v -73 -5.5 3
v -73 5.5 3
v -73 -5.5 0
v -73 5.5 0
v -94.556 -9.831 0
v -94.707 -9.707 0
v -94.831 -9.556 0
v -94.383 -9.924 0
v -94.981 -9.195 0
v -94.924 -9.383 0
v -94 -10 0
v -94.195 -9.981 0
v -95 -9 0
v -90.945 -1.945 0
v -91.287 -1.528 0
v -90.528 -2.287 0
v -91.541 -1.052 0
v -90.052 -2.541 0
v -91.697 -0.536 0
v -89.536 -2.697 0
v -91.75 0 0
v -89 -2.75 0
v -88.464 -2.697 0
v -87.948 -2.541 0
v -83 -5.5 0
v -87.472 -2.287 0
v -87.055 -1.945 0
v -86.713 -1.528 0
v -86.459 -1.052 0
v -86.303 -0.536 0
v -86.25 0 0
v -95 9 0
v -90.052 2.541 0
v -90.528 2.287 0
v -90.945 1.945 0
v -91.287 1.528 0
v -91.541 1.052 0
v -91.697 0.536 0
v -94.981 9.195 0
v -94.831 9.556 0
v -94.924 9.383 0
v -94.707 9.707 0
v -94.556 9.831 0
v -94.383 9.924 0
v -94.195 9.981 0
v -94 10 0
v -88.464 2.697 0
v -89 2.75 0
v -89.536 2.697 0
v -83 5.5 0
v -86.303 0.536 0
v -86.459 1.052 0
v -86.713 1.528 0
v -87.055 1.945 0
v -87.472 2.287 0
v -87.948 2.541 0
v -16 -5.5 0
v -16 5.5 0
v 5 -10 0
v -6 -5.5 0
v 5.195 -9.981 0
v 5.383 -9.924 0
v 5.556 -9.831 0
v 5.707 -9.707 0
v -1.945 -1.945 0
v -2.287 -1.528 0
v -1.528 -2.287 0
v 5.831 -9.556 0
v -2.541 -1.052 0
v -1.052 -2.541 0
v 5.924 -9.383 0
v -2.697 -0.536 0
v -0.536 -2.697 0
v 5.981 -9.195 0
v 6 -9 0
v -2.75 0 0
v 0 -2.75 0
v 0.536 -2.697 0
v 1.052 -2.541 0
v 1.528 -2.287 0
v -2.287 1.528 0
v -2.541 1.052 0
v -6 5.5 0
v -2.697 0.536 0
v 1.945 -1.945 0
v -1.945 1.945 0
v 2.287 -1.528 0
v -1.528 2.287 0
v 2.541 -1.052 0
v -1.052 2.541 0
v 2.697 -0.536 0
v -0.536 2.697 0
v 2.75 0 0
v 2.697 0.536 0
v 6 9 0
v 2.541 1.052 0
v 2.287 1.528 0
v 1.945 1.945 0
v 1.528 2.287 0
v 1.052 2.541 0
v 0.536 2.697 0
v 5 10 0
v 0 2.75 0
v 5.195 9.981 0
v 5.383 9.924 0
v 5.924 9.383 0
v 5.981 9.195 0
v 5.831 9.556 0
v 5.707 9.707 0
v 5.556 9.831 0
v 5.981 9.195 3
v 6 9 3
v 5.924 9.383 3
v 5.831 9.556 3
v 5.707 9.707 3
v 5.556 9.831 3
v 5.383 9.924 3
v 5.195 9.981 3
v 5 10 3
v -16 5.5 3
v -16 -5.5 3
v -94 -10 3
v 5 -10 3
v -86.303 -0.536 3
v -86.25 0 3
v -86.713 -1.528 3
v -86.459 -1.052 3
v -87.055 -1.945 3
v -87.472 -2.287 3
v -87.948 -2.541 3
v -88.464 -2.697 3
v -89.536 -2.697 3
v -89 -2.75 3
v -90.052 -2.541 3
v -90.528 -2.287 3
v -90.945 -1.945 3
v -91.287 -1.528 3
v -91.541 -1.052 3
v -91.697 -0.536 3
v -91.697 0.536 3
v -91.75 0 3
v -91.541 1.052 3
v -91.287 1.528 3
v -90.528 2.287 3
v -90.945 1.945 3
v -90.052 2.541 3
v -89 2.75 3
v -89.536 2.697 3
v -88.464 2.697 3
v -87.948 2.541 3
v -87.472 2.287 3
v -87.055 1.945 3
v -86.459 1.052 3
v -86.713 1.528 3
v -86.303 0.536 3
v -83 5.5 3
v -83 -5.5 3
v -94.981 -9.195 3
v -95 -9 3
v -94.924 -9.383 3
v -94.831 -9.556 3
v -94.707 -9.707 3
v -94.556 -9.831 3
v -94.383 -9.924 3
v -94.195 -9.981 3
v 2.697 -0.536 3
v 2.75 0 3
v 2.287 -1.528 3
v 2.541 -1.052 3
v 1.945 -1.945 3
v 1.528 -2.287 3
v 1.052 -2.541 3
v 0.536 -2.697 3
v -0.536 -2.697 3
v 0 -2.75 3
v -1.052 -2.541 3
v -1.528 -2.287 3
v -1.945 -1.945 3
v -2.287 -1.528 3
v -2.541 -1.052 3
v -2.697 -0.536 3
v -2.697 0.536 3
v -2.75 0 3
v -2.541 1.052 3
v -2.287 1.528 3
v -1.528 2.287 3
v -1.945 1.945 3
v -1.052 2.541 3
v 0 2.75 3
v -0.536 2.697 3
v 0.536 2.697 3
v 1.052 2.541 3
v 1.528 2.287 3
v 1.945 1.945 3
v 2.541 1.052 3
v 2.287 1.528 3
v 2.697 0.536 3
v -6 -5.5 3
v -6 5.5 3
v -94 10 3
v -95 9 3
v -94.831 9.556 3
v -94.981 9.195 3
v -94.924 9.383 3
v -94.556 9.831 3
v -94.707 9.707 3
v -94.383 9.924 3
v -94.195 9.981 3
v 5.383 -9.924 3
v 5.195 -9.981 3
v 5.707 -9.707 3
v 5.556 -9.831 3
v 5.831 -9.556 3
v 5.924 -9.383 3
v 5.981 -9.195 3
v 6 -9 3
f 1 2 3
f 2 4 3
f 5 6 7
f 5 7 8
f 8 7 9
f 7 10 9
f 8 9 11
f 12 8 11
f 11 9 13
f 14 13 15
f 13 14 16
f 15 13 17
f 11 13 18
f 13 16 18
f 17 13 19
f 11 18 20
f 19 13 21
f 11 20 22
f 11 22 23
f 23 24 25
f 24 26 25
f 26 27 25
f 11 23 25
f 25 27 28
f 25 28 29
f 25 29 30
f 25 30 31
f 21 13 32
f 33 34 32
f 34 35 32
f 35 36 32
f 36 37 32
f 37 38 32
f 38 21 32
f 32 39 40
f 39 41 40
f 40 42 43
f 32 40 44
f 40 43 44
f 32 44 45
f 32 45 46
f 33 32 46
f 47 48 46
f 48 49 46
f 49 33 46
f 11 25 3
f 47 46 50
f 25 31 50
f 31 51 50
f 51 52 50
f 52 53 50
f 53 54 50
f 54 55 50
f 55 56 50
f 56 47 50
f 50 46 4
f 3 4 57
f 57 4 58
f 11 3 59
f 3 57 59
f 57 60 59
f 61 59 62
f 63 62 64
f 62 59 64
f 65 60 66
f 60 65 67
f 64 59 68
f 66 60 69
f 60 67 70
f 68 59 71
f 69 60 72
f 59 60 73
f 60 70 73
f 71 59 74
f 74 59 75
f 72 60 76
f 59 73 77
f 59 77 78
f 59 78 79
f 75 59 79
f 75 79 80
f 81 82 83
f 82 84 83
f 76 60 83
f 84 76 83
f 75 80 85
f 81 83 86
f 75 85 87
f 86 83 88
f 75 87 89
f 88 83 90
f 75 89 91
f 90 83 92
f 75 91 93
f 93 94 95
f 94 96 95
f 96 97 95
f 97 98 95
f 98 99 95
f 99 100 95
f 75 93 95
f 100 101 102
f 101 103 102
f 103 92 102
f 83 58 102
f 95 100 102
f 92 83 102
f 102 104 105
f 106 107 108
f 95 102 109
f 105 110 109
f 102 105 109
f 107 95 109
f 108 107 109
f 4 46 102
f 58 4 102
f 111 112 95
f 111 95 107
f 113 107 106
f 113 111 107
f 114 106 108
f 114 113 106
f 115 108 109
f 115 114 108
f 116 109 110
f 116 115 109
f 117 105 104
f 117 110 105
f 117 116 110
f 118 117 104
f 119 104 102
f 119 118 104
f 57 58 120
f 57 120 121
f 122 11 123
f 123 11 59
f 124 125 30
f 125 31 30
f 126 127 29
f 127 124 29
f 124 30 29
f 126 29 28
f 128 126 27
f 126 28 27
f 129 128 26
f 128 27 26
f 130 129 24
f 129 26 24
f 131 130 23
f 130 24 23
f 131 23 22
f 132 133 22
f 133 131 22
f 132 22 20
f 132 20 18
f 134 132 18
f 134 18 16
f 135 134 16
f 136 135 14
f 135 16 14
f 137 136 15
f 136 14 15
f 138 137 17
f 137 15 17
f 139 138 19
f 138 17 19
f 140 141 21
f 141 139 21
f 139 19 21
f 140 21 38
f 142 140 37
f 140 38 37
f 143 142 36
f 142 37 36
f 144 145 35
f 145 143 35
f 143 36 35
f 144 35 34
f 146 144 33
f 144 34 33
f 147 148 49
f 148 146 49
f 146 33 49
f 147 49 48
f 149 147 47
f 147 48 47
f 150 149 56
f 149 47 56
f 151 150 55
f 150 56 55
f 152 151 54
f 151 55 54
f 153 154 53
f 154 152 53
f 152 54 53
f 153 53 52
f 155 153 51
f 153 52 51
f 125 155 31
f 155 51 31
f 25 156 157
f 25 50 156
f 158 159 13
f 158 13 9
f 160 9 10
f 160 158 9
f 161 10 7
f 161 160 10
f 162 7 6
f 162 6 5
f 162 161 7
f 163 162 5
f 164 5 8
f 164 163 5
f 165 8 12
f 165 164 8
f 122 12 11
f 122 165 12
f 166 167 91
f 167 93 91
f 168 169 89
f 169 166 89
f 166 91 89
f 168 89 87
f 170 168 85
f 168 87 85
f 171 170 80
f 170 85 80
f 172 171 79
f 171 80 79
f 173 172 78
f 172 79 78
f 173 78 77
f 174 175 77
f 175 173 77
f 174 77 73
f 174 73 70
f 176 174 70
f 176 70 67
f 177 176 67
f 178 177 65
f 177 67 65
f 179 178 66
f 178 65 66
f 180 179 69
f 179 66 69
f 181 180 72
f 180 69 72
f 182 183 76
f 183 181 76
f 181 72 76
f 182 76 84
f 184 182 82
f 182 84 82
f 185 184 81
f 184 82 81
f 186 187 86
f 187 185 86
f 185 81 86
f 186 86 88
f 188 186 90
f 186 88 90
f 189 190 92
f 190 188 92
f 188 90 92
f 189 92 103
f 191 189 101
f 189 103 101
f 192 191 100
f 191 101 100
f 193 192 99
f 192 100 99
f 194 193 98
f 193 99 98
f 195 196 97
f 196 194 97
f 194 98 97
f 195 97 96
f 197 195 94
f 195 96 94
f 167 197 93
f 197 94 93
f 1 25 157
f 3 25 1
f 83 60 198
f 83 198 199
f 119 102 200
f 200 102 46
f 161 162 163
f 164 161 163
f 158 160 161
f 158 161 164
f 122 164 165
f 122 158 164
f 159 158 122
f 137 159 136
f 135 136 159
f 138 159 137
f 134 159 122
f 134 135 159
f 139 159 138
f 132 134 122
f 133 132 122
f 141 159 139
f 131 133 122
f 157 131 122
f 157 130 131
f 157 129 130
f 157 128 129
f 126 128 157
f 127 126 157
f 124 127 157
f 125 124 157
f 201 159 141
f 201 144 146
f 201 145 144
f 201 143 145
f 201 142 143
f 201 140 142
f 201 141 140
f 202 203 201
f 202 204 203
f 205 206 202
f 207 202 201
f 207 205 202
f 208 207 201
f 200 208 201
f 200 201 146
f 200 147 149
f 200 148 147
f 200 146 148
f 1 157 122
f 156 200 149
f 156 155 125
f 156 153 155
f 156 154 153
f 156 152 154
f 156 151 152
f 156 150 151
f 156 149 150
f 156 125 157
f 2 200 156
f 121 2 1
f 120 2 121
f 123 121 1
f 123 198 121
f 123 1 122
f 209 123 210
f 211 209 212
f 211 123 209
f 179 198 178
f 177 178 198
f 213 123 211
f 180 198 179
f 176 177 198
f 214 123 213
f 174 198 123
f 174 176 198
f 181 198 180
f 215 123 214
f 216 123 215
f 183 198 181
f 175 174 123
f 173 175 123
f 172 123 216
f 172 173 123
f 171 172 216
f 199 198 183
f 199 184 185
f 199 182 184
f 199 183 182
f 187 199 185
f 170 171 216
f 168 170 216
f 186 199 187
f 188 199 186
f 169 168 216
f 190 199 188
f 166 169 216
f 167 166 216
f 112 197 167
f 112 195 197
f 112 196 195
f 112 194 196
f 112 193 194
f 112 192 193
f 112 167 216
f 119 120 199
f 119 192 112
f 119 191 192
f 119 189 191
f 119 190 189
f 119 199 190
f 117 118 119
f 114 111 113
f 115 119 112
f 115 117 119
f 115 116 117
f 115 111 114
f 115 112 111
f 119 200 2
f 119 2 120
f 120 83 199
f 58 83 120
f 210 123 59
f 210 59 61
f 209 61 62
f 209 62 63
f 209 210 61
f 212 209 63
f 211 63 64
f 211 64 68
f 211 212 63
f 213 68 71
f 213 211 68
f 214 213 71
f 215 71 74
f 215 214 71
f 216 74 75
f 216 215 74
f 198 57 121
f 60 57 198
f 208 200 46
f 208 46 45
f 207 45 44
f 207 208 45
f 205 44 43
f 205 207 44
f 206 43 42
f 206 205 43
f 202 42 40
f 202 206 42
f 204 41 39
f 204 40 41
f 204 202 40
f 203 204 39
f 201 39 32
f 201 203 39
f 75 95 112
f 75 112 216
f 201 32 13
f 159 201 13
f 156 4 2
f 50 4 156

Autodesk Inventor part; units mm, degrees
ref_plane "YZ Plane" through (0, 0, 0) normal (1, 0, 0) x (0, 1, 0)
ref_plane "XZ Plane" through (0, 0, 0) normal (0, 1, 0) x (-1, 0, 0)
ref_plane "XY Plane" through (0, 0, 0) normal (0, 0, 1) x (1, 0, 0)
sketch "Sketch1" plane through (0, 0, 0) normal (0, 0, 1) x (1, 0, 0)
  line L0 (-95, -10) -> (95, -10)
  line L1 (95, -10) -> (95, 10)
  line L2 (95, 10) -> (-95, 10)
  line L3 (-95, 10) -> (-95, -10)
  line L4 (-95, -10) -> (95, 10) construction
  line L5 (95, -10) -> (-95, 10) construction
  line L6 (-133, 0) -> (133, 0) construction
  line L7 (-83, -5.5) -> (-6, -5.5)
  line L8 (-6, -5.5) -> (-6, 5.5)
  line L9 (-6, 5.5) -> (-83, 5.5)
  line L10 (-83, 5.5) -> (-83, -5.5)
  line L11 (-83, -5.5) -> (-6, 5.5) construction
  line L12 (-6, -5.5) -> (-83, 5.5) construction
  line L13 (0, 14.2899) -> (0, -14.2899) construction
  line L14 (83, -5.5) -> (6, -5.5)
  line L15 (6, -5.5) -> (6, 5.5)
  line L16 (6, 5.5) -> (83, 5.5)
  line L17 (83, 5.5) -> (83, -5.5)
  line L18 (83, -5.5) -> (6, 5.5) construction
  line L19 (6, -5.5) -> (83, 5.5) construction
  circle A0 centre (-89, 0) radius 2.75
  circle A1 centre (0, 0) radius 2.75
  circle A2 centre (89, 0) radius 2.75
  line L20 (-83, 5.5) -> (-73, 5.5)
  line L21 (-73, 5.5) -> (-73, -5.5)
  line L22 (-73, -5.5) -> (-83, -5.5)
  line L23 (-83, -5.5) -> (-83, 5.5)
  line L24 (-6, 5.5) -> (-16, 5.5)
  line L25 (-16, 5.5) -> (-16, -5.5)
  line L26 (-16, -5.5) -> (-6, -5.5)
  line L27 (-6, -5.5) -> (-6, 5.5)
  line L28 (16, 5.5) -> (16, -5.5)
  line L29 (73, 5.5) -> (73, -5.5)
  line L30 (6, 10) -> (6, 5.4904)
  line L31 (6, 5.4904) -> (6, -10)
  point P0 (-44.5, 0)
  point P1 (44.5, 0)
  point P2 (73, -5.5)
  point P3 (73, 5.5)
  point P4 (-73, 5.5)
  point P5 (6, -5.5)
  dimension "d0" = 190
  dimension "d1" = 20
  dimension "d2" = 11
  dimension "d3" = 12
  dimension "d4" = 6
  dimension "d5" = 5.5
  dimension "d6" = 6
  dimension "d7" = 5.5
  dimension "d11" = 10
  dimension "d12" = 10
extrude "Extrusion1" add sketch "Sketch1" along normal blind 3 contours L3 L2 L30 L15 L31 L0 | L21 L9 L25 L7
fillet "Fillet1" radius 1 4 edges at (-95, -10, 1.5) (-95, 10, 1.5) (6, 10, 1.5) (6, -10, 1.5)
sketch "Sketch2" plane through (0, 0, 3) normal (0, 0, 1) x (1, 0, 0)
  line L0 (-16, 5.5) -> (-6, 5.5) projected
  line L1 (-6, 5.5) -> (-6, -5.5) projected
  line L2 (-6, -5.5) -> (-16, -5.5) projected
  line L3 (-16, -5.5) -> (-16, 5.5) projected
  circle A0 centre (-89, 0) radius 2.75 projected
  circle A1 centre (0, 0) radius 2.75 projected
  arc A2 (5, -10) -> (6, -9) centre (5, -9) ccw projected
  line L4 (6, -9) -> (6, 9) projected
  arc A3 (6, 9) -> (5, 10) centre (5, 9) ccw projected
  line L5 (5, 10) -> (-94, 10) projected
  arc A4 (-94, 10) -> (-95, 9) centre (-94, 9) ccw projected
  line L6 (-95, 9) -> (-95, -9) projected
  arc A5 (-95, -9) -> (-94, -10) centre (-94, -9) ccw projected
  line L7 (-94, -10) -> (5, -10) projected
  line L8 (-73, 5.5) -> (-73, -5.5) projected
  line L9 (-73, -5.5) -> (-83, -5.5) projected
  line L10 (-83, -5.5) -> (-83, 5.5) projected
  line L11 (-83, 5.5) -> (-73, 5.5) projected
equation "\"d6\" = 0.5 * d3"
equation "\"d7\" = d5"
equation "\"d12\" = d11"
properties part number "LED_Holder_BackTop"
